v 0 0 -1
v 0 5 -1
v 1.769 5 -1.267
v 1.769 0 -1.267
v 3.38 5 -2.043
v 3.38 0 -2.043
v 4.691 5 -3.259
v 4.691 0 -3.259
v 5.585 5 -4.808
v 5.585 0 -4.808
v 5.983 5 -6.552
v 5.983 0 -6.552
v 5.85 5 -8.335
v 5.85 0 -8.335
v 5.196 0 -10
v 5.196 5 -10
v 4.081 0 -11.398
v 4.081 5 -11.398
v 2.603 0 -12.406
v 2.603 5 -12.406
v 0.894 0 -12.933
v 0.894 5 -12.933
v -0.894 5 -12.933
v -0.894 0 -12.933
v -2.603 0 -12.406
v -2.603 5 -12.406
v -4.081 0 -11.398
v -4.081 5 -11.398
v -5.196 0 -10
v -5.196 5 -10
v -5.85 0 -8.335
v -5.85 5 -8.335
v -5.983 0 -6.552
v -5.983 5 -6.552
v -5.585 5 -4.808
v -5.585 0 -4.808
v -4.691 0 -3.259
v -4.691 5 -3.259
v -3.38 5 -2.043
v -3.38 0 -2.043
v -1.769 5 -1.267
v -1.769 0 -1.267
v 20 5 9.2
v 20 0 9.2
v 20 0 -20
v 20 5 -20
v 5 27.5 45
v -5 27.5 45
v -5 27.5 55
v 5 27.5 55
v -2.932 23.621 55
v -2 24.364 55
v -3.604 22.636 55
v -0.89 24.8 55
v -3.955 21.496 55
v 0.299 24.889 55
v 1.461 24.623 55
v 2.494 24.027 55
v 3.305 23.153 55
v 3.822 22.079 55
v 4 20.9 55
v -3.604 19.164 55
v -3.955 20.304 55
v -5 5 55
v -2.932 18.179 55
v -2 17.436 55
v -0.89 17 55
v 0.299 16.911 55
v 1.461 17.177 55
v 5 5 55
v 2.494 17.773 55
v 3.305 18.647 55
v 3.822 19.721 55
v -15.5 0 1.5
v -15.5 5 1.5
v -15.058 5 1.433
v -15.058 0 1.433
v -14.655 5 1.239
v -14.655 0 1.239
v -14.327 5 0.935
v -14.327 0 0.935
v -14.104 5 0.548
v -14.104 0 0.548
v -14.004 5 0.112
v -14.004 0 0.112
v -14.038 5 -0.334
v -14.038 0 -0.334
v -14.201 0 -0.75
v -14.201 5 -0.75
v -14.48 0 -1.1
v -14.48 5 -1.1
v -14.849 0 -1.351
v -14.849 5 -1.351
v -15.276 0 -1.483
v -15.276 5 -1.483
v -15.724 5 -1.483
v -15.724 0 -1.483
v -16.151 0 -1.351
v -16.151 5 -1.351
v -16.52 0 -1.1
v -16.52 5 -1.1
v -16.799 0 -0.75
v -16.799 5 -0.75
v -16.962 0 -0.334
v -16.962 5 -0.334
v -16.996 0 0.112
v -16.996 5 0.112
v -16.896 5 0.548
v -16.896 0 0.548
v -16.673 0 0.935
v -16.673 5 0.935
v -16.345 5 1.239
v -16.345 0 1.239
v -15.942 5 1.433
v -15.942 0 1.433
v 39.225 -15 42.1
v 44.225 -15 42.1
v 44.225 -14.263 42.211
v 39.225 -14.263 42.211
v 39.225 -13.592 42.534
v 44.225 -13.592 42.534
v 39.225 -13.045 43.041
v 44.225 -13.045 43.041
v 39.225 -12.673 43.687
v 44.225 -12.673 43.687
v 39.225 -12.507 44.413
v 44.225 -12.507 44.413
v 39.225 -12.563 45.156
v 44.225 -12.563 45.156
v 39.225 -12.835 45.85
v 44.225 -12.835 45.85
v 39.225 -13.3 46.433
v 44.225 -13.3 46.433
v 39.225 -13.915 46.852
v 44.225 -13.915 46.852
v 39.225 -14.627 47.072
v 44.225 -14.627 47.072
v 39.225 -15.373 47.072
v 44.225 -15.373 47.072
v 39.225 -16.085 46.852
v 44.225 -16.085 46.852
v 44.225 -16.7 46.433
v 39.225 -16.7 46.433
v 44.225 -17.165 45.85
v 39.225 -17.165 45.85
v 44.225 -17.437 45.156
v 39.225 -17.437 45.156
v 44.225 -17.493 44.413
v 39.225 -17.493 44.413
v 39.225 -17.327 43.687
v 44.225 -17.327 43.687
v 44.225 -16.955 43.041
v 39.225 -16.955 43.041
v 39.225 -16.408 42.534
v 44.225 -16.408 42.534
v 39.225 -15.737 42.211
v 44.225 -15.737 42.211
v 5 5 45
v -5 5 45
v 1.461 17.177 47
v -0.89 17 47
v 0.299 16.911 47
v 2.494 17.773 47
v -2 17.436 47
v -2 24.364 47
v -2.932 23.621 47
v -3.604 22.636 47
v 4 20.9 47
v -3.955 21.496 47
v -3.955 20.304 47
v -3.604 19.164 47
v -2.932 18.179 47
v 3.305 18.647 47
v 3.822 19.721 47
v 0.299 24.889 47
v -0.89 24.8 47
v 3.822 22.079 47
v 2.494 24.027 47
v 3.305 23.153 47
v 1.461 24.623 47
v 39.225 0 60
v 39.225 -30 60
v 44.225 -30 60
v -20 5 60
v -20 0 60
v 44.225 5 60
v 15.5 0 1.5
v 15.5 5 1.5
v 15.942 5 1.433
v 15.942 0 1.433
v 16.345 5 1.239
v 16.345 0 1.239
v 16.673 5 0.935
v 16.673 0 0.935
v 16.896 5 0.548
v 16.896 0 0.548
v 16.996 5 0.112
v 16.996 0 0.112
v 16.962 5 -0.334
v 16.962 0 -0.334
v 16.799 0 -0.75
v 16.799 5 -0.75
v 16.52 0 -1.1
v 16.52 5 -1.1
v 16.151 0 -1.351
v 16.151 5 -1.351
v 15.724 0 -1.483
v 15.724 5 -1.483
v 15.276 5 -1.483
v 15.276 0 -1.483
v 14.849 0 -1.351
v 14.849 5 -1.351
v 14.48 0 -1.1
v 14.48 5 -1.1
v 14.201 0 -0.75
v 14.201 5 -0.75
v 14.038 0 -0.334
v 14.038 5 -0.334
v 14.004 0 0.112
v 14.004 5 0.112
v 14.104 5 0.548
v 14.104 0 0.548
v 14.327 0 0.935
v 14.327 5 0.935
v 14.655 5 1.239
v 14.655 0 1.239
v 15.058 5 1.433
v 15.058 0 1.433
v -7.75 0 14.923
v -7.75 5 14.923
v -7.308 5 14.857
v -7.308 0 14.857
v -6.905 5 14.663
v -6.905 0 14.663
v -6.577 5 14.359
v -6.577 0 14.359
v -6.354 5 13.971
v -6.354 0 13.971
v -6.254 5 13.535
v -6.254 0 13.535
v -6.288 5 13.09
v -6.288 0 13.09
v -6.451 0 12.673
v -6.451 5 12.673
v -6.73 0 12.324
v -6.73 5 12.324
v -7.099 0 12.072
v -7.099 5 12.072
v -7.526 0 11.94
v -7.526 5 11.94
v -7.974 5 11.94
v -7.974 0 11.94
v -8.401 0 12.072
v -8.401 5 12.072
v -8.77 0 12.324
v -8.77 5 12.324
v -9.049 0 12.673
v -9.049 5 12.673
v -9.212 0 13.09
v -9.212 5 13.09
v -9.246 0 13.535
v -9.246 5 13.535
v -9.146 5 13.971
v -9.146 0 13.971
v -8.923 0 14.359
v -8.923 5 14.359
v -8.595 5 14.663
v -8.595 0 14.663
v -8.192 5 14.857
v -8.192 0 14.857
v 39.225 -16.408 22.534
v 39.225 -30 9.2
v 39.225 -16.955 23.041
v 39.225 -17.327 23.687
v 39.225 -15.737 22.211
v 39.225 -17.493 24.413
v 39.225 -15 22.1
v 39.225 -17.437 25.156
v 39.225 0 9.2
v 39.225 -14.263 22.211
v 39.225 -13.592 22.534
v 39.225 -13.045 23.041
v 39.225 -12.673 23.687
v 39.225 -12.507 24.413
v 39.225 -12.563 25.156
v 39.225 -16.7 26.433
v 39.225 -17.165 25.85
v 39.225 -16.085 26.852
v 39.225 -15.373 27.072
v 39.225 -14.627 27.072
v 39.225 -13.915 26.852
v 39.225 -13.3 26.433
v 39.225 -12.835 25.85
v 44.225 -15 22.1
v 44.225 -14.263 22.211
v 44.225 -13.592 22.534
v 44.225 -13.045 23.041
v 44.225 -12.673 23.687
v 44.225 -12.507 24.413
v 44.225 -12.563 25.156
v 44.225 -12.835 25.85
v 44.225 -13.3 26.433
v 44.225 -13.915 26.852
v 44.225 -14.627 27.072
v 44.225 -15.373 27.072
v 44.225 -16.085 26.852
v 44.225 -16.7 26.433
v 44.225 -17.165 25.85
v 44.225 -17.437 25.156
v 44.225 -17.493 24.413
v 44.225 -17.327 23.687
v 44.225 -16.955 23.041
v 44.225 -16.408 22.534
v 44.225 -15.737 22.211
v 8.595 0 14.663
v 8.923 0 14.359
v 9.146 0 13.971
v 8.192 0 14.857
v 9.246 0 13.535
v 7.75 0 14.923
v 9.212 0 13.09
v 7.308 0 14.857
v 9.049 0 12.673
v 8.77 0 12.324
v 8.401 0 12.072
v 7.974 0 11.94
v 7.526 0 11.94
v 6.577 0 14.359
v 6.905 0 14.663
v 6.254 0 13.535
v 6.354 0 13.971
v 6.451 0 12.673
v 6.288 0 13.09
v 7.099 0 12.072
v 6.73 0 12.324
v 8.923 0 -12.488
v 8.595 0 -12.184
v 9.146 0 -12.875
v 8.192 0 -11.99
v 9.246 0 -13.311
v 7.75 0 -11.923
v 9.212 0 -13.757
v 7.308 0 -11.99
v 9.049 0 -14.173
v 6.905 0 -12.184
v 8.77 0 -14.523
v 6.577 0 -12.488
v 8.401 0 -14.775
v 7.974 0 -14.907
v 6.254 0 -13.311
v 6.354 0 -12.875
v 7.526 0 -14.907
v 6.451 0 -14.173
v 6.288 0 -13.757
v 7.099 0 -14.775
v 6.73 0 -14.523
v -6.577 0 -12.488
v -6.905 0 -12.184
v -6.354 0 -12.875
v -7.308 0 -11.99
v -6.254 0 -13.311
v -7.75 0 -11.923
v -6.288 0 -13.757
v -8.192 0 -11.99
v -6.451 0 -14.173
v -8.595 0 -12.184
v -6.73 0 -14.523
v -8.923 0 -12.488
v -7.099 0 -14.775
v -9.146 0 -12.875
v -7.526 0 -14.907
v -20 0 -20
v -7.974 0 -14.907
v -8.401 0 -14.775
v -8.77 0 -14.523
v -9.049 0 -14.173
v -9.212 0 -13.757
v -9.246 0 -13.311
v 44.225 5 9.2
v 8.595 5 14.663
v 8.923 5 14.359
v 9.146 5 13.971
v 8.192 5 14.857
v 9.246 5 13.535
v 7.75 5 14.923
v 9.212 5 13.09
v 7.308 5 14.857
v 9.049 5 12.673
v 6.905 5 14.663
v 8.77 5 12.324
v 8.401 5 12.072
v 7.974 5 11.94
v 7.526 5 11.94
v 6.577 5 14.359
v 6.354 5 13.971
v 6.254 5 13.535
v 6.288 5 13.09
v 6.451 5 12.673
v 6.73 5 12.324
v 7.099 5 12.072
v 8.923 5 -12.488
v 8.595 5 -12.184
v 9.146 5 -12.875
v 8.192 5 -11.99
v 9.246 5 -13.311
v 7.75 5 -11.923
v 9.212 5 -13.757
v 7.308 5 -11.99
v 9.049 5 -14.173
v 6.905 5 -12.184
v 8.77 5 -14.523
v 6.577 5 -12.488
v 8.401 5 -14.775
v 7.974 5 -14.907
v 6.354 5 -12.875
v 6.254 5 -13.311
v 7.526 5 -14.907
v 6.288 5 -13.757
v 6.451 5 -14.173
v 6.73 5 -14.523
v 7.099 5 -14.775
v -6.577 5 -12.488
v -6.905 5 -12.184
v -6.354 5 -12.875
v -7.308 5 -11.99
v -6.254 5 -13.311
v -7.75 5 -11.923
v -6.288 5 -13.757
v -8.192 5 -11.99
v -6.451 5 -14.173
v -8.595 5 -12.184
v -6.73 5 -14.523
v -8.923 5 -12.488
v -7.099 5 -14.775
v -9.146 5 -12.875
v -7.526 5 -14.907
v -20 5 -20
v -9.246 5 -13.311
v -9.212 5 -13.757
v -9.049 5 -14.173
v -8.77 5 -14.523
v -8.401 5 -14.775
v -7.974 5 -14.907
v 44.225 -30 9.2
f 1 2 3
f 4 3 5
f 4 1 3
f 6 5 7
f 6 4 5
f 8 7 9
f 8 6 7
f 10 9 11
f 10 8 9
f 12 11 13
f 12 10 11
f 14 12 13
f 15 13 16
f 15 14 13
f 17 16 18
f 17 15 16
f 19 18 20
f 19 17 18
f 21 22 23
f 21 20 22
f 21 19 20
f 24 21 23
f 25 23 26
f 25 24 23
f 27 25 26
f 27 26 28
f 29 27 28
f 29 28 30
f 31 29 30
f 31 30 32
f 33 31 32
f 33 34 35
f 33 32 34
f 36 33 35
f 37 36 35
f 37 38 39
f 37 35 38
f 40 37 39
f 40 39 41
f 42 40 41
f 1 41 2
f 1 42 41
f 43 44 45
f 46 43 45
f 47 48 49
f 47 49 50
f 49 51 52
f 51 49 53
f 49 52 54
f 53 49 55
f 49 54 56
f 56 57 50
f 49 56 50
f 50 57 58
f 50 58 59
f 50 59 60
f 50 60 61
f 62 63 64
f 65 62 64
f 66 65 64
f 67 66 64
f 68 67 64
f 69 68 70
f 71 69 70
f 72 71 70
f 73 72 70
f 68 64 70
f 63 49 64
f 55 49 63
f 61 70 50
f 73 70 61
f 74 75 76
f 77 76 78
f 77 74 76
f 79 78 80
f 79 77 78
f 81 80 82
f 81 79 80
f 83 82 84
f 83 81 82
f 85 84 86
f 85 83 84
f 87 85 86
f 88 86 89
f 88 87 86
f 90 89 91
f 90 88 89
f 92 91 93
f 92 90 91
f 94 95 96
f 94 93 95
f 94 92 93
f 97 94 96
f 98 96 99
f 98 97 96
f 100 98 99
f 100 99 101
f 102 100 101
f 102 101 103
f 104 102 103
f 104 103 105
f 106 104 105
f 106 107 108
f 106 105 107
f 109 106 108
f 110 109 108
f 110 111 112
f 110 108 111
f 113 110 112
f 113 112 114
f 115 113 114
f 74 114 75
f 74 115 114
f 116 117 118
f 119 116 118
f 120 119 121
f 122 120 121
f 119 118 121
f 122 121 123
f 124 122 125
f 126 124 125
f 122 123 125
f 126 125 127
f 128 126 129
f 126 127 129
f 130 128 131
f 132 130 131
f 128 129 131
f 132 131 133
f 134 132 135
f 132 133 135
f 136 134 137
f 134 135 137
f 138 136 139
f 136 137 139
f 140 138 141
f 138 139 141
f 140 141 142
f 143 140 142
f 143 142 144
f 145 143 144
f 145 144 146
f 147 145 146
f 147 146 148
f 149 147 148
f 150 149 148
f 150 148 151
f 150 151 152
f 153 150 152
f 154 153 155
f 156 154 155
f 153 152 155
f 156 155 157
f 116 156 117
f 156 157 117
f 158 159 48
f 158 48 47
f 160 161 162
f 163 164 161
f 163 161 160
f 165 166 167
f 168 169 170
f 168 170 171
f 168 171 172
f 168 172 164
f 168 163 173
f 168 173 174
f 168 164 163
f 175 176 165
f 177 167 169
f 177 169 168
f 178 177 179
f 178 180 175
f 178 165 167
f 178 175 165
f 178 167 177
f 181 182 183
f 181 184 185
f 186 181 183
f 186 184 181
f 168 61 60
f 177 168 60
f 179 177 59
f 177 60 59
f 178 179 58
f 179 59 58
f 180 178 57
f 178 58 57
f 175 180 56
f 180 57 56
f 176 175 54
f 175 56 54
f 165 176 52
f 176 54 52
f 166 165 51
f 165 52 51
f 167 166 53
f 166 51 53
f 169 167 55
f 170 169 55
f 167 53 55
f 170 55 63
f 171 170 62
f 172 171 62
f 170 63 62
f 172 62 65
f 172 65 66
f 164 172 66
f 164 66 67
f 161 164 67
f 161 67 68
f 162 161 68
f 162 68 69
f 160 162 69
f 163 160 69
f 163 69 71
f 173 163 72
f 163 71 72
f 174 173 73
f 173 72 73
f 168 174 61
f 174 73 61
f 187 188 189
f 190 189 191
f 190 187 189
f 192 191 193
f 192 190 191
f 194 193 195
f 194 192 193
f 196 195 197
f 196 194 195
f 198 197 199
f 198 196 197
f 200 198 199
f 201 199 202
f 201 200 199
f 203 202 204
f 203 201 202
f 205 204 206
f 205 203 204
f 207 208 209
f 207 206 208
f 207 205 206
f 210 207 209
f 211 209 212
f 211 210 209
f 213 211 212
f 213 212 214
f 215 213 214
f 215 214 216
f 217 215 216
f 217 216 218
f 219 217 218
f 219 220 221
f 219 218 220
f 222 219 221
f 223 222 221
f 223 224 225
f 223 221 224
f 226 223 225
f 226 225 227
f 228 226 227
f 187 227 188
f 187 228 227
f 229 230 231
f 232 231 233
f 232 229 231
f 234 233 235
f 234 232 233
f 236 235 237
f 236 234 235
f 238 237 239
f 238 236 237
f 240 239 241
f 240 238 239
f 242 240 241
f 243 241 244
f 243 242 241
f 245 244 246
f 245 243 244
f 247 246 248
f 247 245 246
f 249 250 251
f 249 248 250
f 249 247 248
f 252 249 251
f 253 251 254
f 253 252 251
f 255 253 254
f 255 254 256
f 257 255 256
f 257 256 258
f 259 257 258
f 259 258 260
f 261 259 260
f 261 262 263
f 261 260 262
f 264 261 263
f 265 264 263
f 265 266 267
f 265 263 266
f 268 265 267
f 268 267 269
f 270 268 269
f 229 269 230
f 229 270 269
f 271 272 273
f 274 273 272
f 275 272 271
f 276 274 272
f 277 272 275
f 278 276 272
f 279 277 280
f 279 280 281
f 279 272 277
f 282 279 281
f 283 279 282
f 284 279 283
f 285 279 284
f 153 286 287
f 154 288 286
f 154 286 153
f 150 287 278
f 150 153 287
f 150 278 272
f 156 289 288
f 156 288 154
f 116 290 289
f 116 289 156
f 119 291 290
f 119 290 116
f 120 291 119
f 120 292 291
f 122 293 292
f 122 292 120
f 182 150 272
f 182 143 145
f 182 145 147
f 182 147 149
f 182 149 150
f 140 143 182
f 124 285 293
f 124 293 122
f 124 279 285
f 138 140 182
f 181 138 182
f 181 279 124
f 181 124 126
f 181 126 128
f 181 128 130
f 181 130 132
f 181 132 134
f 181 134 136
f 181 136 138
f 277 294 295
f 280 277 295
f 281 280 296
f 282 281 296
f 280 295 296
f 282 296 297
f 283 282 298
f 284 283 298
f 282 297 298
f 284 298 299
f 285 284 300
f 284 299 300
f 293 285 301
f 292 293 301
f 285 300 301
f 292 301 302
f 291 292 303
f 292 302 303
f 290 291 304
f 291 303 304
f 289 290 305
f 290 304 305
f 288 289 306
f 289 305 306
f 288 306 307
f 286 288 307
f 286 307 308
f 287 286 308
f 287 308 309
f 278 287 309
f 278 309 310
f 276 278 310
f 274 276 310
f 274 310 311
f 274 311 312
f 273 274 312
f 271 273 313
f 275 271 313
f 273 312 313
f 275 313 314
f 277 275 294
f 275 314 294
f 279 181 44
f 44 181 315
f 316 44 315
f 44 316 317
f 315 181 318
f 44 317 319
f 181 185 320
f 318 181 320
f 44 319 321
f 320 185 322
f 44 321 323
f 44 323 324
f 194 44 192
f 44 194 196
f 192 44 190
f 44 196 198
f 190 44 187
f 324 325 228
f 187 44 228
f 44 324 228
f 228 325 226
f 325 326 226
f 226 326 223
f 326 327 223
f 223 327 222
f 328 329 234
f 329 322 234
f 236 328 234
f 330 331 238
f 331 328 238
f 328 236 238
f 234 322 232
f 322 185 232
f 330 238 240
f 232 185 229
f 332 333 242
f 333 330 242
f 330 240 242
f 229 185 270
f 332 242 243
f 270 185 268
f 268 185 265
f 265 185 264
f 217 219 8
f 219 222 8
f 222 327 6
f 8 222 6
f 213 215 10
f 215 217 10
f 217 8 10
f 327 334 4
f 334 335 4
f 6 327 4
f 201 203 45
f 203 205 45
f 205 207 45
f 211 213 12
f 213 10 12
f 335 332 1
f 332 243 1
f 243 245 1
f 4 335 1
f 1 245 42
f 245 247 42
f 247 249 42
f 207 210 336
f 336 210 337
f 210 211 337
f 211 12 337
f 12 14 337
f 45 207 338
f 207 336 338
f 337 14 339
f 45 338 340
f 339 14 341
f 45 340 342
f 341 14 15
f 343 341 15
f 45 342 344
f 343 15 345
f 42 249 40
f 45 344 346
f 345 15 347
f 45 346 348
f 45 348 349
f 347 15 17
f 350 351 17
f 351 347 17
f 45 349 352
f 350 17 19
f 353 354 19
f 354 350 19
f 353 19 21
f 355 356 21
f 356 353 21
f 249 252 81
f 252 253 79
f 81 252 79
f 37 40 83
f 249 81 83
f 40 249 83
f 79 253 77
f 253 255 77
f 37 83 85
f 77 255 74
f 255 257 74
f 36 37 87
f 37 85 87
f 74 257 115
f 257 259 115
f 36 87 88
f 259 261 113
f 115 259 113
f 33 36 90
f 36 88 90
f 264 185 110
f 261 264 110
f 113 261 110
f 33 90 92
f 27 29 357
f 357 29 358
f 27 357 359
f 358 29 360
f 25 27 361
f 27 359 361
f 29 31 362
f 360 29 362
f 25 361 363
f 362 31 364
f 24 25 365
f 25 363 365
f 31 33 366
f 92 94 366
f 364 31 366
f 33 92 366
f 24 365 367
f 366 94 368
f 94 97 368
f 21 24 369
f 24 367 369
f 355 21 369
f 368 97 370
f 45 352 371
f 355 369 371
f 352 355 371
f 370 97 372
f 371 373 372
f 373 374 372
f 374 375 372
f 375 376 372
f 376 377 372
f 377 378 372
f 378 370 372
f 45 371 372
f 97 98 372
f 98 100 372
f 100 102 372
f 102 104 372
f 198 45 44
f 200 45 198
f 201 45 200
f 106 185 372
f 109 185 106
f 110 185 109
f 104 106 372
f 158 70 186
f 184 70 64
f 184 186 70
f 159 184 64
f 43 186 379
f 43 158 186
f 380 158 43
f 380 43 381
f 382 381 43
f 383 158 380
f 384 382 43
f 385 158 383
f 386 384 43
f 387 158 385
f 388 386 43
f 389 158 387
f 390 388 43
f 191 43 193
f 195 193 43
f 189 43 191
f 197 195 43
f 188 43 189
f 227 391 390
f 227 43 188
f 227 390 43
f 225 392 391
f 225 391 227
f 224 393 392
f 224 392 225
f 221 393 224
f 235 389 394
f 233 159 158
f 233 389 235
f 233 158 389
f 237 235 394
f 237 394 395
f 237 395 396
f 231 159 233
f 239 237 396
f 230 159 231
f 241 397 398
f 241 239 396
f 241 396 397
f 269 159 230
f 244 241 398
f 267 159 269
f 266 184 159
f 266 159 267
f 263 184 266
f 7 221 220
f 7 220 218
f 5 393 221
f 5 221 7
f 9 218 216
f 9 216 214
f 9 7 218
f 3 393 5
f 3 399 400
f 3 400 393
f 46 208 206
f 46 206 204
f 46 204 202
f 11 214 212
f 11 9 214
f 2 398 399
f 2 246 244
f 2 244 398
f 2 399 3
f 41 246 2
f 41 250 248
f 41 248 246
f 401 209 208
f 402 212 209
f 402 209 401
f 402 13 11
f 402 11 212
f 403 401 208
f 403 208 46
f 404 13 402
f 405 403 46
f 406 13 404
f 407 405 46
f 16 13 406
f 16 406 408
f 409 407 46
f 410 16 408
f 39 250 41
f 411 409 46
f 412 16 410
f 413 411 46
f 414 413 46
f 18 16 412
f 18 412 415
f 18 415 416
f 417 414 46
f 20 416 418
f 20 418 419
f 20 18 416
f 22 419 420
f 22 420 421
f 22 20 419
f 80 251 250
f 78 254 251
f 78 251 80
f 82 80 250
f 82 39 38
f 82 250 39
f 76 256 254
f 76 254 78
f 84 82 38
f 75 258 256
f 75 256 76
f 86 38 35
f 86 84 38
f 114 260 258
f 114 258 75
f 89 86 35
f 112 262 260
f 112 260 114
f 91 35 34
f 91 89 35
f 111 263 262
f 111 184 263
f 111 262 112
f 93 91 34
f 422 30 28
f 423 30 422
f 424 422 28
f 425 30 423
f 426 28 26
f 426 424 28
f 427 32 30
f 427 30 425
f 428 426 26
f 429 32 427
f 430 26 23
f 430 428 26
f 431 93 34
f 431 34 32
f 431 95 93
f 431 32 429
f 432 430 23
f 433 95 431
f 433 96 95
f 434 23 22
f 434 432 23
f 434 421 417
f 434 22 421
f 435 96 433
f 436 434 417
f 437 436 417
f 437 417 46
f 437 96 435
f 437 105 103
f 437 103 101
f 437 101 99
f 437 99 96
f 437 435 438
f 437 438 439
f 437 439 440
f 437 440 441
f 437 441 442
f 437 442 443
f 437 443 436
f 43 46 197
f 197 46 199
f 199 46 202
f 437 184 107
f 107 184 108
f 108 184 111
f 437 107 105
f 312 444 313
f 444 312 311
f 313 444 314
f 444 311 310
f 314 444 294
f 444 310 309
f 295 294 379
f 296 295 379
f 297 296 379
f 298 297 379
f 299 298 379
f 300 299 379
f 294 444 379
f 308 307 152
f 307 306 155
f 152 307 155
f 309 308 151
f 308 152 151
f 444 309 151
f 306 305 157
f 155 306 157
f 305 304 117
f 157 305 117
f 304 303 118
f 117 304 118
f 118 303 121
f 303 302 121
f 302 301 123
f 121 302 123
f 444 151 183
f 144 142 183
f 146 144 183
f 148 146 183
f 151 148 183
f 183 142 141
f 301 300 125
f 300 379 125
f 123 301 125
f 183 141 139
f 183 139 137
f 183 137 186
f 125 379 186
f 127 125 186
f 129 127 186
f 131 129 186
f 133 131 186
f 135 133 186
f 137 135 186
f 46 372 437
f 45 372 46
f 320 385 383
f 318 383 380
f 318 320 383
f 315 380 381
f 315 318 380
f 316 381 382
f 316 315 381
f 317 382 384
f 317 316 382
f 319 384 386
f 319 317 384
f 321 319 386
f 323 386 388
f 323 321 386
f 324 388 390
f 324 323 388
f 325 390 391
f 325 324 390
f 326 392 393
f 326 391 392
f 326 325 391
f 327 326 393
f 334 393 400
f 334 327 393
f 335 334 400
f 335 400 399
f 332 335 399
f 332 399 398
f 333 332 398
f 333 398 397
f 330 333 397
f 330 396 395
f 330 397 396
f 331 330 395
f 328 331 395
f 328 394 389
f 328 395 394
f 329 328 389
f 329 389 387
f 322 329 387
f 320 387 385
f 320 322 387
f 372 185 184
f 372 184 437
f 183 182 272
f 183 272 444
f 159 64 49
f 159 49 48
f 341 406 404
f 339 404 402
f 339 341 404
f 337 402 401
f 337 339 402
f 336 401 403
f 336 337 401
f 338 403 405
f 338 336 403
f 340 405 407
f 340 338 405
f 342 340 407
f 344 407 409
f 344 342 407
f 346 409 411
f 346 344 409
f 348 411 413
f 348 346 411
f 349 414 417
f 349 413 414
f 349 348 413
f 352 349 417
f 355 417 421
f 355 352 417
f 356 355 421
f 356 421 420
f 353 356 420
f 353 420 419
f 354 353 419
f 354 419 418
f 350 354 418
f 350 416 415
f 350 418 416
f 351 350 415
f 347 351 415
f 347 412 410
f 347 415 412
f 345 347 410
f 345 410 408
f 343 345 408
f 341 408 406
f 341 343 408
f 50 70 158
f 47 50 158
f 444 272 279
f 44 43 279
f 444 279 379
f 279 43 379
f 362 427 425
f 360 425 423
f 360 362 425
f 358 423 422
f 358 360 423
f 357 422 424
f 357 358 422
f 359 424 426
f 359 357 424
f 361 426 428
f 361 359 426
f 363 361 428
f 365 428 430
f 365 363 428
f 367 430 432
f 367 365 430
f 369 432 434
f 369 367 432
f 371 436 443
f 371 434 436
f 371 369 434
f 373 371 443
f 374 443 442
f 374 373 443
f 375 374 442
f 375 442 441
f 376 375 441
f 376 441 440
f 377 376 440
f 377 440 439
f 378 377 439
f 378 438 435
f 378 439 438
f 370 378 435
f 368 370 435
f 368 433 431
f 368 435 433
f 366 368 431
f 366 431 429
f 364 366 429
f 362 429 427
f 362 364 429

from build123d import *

# Parameters (mm, degrees)
SKETCH3_W           = 40
SKETCH3_H           = 80
BOSS_EXTRUDE1_DEPTH = 5
SKETCH1_R           = 1.5
SKETCH1_R_2         = 6
CUT_EXTRUDE3_DEPTH  = 64.442887702
SKETCH4_W           = 10
SKETCH4_H           = 10
BOSS_EXTRUDE2_DEPTH = 22.5
SKETCH5_R           = 4
CUT_EXTRUDE4_DEPTH  = 8
SKETCH6_W           = 50.8
SKETCH6_H           = 5
BOSS_EXTRUDE3_DEPTH = 24.225
SKETCH8_W           = 5
SKETCH8_H           = 50.8
BOSS_EXTRUDE4_DEPTH = 30
SKETCH9_R           = 2.5
CUT_EXTRUDE5_DEPTH  = 5


with BuildPart() as part:
    # Sketch3 → Boss-Extrude1 (new body)
    with BuildSketch(Plane(origin=(0, 0, 0), x_dir=(1, 0, 0), z_dir=(0, 1, 0))):
        with Locations((0, -20)):
            Rectangle(SKETCH3_W, SKETCH3_H)
    extrude(amount=BOSS_EXTRUDE1_DEPTH)

    # Sketch1 → Cut-Extrude3 (cut, through all)
    with BuildSketch(Plane(origin=(0, 0, 0), x_dir=(1, 0, 0), z_dir=(0, 1, 0))):
        with Locations(Location((-15.5, 0, 0), (0, 0, 270))):
            Circle(SKETCH1_R)
        with Locations(Location((-7.75, 13.423393759, 0), (0, 0, 270))):
            Circle(SKETCH1_R)
        with Locations(Location((7.75, 13.423393759, 0), (0, 0, 270))):
            Circle(SKETCH1_R)
        with Locations(Location((15.5, 0, 0), (0, 0, 270))):
            Circle(SKETCH1_R)
        with Locations(Location((7.75, -13.423393759, 0), (0, 0, 270))):
            Circle(SKETCH1_R)
        with Locations(Location((-7.75, -13.423393759, 0), (0, 0, 270))):
            Circle(SKETCH1_R)
        with Locations(Location((0, 7, 0), (0, 0, 270))):
            Circle(SKETCH1_R_2)
    extrude(amount=CUT_EXTRUDE3_DEPTH, mode=Mode.SUBTRACT)

    # Sketch4 → Boss-Extrude2 (add)
    with BuildSketch(Plane(origin=(0, 5, 0), x_dir=(1, 0, 0), z_dir=(0, 1, 0))):
        with Locations((0, -50)):
            Rectangle(SKETCH4_W, SKETCH4_H)
    extrude(amount=BOSS_EXTRUDE2_DEPTH)

    # Sketch5 → Cut-Extrude4 (cut)
    with BuildSketch(Plane.XY.offset(55)):
        with Locations((0, 20.9)):
            Circle(SKETCH5_R)
    extrude(amount=-CUT_EXTRUDE4_DEPTH, mode=Mode.SUBTRACT)

    # Sketch6 → Boss-Extrude3 (add)
    with BuildSketch(Plane(origin=(20, 0, 0), x_dir=(0, 0, -1), z_dir=(1, 0, 0))):
        with Locations((-34.6, 2.5)):
            Rectangle(SKETCH6_W, SKETCH6_H)
    extrude(amount=BOSS_EXTRUDE3_DEPTH)

    # Sketch8 → Boss-Extrude4 (add)
    with BuildSketch(Plane.XZ):
        with Locations((41.725, 34.6)):
            Rectangle(SKETCH8_W, SKETCH8_H)
    extrude(amount=BOSS_EXTRUDE4_DEPTH)

    # Sketch9 → Cut-Extrude5 (cut)
    with BuildSketch(Plane(origin=(44.225, 0, 0), x_dir=(0, 0, -1), z_dir=(1, 0, 0))):
        with Locations((-44.6, -15)):
            Circle(SKETCH9_R)
        with Locations((-24.6, -15)):
            Circle(SKETCH9_R)
    extrude(amount=-CUT_EXTRUDE5_DEPTH, mode=Mode.SUBTRACT)


solid = part.part
